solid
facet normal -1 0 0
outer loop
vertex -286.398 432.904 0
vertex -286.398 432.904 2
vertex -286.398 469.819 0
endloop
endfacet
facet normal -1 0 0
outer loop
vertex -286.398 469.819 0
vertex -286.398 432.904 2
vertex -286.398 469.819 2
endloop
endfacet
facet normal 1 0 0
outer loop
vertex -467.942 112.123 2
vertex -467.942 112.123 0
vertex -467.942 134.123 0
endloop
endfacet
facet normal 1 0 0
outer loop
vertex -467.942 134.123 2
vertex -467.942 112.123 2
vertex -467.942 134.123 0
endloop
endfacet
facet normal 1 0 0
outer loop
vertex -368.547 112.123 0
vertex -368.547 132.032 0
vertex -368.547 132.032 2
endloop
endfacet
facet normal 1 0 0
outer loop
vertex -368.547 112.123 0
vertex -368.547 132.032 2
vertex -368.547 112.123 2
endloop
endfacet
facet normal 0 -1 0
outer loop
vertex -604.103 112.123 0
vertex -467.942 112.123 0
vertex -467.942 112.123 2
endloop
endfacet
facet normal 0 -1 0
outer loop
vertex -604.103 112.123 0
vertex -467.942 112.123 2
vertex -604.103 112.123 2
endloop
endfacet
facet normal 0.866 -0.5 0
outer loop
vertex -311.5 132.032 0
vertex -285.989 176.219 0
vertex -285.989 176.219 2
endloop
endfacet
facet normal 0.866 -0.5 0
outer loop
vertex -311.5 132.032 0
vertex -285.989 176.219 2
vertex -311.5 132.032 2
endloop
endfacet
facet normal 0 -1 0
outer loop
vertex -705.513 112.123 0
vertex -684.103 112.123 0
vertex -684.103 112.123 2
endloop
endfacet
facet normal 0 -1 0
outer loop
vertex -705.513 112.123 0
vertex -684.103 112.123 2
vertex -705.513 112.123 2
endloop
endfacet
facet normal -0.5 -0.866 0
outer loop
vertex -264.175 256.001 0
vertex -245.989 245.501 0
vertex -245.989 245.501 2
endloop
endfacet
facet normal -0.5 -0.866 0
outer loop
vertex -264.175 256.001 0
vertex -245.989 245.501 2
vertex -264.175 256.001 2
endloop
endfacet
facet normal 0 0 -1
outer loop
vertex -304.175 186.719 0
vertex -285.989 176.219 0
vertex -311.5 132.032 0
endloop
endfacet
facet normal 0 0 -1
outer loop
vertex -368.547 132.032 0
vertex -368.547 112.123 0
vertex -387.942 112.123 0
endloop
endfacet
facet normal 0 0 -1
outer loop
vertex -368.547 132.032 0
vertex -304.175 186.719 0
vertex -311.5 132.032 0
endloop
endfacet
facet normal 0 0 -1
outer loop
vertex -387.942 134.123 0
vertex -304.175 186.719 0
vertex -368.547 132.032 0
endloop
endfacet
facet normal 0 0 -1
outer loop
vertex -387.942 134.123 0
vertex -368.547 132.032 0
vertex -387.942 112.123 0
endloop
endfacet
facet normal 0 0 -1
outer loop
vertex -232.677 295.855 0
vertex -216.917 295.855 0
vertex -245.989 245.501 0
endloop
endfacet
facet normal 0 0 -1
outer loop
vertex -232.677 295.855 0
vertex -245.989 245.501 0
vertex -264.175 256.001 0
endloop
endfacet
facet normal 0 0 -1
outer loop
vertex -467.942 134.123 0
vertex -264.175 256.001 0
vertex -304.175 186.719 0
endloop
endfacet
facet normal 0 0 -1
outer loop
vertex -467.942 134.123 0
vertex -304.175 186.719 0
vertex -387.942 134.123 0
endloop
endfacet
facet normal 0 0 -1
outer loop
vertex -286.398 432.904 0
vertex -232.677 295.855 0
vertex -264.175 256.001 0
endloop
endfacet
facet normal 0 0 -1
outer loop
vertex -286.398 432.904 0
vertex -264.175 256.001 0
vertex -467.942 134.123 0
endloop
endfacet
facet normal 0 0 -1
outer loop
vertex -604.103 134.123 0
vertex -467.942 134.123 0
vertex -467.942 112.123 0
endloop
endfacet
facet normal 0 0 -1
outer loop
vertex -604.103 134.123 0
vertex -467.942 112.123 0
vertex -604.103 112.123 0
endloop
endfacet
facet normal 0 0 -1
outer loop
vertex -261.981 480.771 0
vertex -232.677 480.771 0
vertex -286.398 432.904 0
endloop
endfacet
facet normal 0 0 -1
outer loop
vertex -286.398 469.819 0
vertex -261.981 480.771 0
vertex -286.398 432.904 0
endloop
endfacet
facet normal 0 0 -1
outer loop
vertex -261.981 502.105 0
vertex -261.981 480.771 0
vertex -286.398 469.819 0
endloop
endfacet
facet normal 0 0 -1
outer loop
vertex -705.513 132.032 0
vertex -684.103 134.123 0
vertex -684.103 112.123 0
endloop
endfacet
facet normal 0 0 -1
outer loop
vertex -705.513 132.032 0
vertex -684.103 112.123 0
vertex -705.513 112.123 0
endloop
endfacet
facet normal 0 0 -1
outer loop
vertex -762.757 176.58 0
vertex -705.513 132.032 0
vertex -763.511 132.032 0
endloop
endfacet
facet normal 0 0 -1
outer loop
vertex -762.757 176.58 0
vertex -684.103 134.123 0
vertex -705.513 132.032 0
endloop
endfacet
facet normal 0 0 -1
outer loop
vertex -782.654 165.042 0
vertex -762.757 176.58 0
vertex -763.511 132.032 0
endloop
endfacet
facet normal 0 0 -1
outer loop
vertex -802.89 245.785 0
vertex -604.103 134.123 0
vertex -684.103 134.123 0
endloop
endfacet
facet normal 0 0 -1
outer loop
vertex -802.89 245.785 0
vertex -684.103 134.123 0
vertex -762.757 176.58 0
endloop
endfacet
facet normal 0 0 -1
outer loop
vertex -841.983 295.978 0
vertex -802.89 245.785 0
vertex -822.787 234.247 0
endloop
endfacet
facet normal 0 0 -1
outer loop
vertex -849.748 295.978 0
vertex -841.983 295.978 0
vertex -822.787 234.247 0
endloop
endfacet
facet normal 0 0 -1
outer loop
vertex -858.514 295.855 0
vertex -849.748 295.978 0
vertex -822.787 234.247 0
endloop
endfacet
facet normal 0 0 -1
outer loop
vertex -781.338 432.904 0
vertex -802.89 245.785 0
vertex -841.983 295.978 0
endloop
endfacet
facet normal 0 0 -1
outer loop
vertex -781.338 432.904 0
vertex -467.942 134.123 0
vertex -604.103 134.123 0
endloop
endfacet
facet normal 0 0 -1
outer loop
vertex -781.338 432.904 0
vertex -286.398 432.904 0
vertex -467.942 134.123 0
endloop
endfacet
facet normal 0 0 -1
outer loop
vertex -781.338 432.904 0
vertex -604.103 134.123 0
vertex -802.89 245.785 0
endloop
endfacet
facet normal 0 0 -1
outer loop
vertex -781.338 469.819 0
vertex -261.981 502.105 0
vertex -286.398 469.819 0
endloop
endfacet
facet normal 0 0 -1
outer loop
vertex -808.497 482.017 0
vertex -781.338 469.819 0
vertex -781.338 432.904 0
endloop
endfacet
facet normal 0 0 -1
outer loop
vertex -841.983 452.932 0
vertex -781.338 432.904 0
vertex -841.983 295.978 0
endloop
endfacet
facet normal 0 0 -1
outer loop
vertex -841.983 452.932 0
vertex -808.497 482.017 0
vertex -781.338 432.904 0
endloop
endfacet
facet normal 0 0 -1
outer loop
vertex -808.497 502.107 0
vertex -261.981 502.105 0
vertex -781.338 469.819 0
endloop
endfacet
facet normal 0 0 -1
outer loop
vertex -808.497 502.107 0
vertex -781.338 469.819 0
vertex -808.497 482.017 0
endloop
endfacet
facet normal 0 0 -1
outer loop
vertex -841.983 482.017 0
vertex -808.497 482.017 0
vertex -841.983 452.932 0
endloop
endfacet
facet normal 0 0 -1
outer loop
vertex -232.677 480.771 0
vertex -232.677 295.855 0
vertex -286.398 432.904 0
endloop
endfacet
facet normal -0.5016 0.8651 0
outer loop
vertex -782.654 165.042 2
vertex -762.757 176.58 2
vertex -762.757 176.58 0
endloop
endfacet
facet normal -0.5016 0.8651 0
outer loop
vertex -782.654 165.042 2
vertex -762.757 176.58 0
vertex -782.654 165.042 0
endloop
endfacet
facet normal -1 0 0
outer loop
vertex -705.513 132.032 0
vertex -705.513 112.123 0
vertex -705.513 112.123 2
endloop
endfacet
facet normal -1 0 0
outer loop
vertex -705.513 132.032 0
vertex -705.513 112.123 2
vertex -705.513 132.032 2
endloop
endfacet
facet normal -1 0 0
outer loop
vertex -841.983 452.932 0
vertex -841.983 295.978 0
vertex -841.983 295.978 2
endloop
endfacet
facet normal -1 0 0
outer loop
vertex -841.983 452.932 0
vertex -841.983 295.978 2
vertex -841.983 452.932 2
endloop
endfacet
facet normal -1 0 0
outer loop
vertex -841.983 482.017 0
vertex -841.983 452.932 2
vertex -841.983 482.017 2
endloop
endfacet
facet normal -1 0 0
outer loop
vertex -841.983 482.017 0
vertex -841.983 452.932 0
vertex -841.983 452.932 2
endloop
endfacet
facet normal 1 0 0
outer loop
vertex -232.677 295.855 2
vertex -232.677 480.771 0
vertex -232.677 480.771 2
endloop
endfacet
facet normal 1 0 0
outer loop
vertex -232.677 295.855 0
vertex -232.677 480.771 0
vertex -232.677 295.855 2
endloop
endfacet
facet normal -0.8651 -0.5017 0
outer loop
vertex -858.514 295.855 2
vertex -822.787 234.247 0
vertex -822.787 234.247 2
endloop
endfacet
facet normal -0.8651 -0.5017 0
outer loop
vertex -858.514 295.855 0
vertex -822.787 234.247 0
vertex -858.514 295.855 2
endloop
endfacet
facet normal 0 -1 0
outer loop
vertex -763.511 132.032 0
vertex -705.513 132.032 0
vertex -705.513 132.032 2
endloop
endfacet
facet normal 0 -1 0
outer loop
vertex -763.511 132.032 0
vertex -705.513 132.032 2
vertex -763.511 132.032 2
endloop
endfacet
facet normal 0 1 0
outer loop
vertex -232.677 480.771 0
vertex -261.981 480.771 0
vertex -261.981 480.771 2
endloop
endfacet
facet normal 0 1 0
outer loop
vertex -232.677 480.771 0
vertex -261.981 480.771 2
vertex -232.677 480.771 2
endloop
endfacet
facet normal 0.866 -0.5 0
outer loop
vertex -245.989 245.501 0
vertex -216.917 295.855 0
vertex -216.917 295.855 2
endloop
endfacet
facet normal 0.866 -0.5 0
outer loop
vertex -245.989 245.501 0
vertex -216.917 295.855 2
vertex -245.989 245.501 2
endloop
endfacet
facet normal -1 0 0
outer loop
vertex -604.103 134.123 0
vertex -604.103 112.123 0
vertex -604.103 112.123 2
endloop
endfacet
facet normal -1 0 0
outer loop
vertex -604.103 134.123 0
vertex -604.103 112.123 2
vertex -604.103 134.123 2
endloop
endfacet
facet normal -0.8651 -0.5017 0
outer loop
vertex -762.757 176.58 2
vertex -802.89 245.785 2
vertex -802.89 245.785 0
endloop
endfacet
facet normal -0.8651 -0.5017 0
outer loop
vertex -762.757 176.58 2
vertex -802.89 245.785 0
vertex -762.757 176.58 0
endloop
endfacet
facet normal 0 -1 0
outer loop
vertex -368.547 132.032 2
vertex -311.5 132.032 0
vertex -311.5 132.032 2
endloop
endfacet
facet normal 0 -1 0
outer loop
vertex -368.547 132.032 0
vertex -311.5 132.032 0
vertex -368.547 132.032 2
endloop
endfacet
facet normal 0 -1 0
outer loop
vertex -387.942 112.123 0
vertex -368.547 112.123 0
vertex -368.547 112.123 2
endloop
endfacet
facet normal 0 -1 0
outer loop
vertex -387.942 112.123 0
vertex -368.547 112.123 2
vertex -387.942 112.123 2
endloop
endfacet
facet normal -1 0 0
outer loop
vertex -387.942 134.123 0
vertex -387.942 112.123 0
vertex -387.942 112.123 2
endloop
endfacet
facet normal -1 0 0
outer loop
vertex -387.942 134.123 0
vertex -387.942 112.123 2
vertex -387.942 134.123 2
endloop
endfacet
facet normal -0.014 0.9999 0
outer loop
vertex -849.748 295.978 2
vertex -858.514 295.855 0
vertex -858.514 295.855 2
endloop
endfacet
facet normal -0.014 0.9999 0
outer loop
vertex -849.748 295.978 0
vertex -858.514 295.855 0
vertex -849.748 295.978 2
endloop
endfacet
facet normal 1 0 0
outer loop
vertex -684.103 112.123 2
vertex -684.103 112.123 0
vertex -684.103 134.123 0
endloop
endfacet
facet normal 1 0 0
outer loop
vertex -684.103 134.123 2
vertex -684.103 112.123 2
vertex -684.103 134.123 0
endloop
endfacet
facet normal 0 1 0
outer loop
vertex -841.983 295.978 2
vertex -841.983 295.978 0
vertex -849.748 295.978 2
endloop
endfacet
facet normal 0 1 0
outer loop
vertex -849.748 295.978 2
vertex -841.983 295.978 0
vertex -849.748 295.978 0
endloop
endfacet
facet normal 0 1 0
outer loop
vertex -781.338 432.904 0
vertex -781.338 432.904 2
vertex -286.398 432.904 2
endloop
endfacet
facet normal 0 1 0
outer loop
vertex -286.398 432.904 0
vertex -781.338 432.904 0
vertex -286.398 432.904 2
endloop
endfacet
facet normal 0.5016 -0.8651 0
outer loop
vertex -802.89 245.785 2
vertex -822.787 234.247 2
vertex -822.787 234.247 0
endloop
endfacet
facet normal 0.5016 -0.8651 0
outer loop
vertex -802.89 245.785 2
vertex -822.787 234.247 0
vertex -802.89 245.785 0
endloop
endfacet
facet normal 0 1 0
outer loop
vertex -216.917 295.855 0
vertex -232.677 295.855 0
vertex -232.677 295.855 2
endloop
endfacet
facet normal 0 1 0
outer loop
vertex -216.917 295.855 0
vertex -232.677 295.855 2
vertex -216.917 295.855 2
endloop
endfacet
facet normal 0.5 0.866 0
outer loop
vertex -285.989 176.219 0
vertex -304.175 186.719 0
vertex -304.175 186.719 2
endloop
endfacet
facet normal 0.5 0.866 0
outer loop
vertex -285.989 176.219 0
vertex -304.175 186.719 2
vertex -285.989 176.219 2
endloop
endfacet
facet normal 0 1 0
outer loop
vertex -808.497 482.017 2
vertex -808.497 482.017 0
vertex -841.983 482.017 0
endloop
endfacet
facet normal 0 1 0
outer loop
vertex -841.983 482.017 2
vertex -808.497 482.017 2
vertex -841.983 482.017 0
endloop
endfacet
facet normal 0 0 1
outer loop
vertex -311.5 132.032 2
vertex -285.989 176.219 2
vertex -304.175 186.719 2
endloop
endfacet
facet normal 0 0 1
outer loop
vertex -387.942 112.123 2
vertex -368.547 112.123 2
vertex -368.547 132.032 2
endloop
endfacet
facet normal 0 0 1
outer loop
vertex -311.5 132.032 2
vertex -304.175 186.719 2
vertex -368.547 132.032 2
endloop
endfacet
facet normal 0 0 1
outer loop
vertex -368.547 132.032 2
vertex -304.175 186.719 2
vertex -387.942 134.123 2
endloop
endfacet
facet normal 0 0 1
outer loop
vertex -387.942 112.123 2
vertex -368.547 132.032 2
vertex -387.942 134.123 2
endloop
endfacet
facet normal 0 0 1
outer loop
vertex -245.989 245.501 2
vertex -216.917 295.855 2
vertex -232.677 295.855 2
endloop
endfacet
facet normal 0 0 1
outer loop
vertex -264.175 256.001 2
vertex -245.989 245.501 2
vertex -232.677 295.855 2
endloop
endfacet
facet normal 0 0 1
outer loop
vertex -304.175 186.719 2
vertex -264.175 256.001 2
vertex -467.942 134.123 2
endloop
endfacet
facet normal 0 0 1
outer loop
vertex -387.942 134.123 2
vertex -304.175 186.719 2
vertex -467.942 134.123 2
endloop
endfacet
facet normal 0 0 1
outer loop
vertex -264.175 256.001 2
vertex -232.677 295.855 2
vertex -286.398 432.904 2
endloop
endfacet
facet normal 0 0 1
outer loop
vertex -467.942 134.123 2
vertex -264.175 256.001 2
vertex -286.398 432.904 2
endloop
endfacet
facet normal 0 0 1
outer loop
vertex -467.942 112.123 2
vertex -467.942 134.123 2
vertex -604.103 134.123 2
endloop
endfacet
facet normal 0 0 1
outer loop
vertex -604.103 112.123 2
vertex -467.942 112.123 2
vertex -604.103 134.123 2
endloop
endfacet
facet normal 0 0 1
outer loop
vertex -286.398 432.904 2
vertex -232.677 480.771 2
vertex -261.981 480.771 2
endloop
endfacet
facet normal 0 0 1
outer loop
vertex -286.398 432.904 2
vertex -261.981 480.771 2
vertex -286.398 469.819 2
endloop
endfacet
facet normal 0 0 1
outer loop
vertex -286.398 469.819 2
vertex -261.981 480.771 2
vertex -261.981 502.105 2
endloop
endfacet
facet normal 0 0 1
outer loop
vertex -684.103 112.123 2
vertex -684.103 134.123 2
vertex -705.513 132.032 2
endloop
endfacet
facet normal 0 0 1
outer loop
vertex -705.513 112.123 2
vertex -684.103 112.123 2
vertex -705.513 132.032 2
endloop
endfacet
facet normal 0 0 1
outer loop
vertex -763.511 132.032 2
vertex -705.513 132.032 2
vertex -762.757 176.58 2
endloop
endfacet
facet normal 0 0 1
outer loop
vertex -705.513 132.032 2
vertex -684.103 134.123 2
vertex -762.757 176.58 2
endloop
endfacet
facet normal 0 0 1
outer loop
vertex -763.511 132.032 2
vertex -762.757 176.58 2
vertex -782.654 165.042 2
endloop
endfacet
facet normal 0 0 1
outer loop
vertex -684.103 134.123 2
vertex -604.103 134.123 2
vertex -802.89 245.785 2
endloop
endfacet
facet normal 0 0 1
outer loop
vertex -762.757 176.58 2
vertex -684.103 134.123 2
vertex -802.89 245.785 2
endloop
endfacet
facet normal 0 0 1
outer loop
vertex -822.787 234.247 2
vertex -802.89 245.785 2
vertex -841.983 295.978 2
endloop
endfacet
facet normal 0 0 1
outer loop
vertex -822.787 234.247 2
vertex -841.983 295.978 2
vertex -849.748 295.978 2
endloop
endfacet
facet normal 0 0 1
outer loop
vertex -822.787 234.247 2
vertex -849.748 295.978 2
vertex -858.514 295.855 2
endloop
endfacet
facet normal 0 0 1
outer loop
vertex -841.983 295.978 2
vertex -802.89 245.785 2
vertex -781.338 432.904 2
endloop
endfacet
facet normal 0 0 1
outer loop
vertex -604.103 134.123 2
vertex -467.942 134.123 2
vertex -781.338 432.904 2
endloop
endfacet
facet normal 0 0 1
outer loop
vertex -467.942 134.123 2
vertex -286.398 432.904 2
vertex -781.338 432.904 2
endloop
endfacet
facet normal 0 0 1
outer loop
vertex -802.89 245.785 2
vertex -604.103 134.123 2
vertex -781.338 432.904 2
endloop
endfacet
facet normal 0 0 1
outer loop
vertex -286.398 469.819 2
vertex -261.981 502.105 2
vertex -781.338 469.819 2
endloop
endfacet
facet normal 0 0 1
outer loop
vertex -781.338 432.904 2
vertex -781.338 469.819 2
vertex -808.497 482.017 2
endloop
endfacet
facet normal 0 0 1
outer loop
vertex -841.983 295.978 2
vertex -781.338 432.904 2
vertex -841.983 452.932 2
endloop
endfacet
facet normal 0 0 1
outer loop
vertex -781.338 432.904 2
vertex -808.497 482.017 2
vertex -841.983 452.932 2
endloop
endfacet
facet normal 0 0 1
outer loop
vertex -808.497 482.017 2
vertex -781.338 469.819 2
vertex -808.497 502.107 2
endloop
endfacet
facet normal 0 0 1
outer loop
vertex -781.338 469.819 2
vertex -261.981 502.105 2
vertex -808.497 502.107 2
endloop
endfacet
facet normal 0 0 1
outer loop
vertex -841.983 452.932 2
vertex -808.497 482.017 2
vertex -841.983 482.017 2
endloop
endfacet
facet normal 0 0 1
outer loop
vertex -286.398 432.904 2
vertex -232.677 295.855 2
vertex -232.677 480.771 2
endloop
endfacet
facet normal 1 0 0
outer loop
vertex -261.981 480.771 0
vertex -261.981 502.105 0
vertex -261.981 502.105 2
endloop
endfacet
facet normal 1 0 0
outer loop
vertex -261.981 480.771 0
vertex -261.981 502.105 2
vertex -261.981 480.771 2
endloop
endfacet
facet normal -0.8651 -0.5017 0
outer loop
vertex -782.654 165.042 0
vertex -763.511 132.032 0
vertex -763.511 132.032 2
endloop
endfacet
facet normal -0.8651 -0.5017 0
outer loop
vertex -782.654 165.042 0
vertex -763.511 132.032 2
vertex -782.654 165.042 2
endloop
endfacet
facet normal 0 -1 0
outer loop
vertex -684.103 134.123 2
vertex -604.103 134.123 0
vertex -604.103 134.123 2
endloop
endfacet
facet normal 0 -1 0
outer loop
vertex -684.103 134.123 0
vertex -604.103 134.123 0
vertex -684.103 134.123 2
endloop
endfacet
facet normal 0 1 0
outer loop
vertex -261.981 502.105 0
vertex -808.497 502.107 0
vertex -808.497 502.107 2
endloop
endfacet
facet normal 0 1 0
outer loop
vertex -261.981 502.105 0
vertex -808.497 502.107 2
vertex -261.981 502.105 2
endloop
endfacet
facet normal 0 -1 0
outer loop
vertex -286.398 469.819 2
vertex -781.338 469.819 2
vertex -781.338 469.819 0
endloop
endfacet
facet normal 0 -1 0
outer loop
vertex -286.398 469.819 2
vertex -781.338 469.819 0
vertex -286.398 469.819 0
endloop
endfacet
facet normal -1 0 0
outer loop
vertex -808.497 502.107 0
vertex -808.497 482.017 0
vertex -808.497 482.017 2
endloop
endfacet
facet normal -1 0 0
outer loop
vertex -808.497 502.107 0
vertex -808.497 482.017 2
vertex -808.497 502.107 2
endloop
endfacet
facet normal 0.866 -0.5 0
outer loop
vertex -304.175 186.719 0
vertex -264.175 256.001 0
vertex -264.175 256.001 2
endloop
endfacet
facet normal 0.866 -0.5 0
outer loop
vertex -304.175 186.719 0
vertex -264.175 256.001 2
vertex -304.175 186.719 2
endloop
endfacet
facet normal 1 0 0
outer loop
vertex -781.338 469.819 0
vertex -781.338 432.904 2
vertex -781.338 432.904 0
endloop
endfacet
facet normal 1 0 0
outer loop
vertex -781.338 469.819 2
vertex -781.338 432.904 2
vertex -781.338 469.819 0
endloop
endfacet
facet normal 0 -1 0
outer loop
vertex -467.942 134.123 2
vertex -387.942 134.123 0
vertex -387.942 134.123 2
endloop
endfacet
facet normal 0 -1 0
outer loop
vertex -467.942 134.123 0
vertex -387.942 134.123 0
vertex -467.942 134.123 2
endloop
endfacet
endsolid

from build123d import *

# Parameters (mm, degrees)
BOSS_EXTRUDE1_DEPTH = 2
CUT_EXTRUDE1_DEPTH  = 103
CUT_EXTRUDE2_DEPTH  = 103
SKETCH8_W           = 494.939291997
SKETCH8_H           = 36.91417239
CUT_EXTRUDE3_DEPTH  = 103
SKETCH9_W           = 80
SKETCH9_H           = 22
CUT_EXTRUDE4_DEPTH  = 103
SKETCH10_W          = 80
SKETCH10_H          = 22
CUT_EXTRUDE5_DEPTH  = 10
CUT_EXTRUDE26_DEPTH = 50
SKETCH20_W          = 123.508554763
SKETCH20_H          = 186.038500142
CUT_EXTRUDE27_DEPTH = 50


with BuildPart() as part:
    # Sketch4 → Boss-Extrude1 (new body)
    with BuildSketch(Plane.XY):
        Polygon((-808.497250172, 502.106800376), (-261.98073047, 502.105226222), (-261.98073047, 480.770733626), (-232.677404129, 480.770733626), (-232.677404129, 452.134951617), (-212.25184889, 452.134951617), (-212.192076558, 346.868854324), (-232.677404129, 346.868854324), (-232.677404129, 295.854721303), (-216.917061767, 295.854721303), (-311.499917796, 132.032409135), (-368.546557809, 132.032409135), (-368.546557809, 112.12343356), (-705.513477189, 112.12343356), (-705.513477189, 132.032409135), (-763.511495449, 132.032409135), (-858.513561886, 295.854721303), (-842.744632695, 296.076779874), (-842.744632695, 346.305423028), (-862.968217561, 346.305423028), (-862.968217561, 452.932027611), (-841.983456779, 452.932027611), (-841.983456779, 482.016653843), (-813.304156304, 482.016653843), (-808.497250172, 482.016653843), align=None)
    extrude(amount=BOSS_EXTRUDE1_DEPTH)

    # Sketch6 → Cut-Extrude1 (cut)
    with BuildSketch(Plane.XY.offset(2)):
        Polygon((-822.786730896, 234.247092346), (-802.890229544, 245.785256582), (-762.757484374, 176.580034487), (-782.653985726, 165.041870251), align=None)
    extrude(amount=-CUT_EXTRUDE1_DEPTH, mode=Mode.SUBTRACT)

    # Sketch7 → Cut-Extrude2 (cut)
    with BuildSketch(Plane(origin=(0, 0, 0), x_dir=(-1, 0, 0), z_dir=(0, 0, -1))):
        Polygon((245.988579257, 245.501375956), (264.175112736, 256.001375956), (304.175112736, 186.719343654), (285.988579257, 176.219343654), align=None)
    extrude(amount=-CUT_EXTRUDE2_DEPTH, mode=Mode.SUBTRACT)

    # Sketch8 → Cut-Extrude3 (cut)
    with BuildSketch(Plane.XY.offset(2)):
        with Locations((-533.868102369, 451.361565469)):
            Rectangle(SKETCH8_W, SKETCH8_H)
    extrude(amount=-CUT_EXTRUDE3_DEPTH, mode=Mode.SUBTRACT)

    # Sketch9 → Cut-Extrude4 (cut)
    with BuildSketch(Plane(origin=(0, 0, 0), x_dir=(-1, 0, 0), z_dir=(0, 0, -1))):
        with Locations((427.942047779, 123.12343356)):
            Rectangle(SKETCH9_W, SKETCH9_H)
    extrude(amount=-CUT_EXTRUDE4_DEPTH, mode=Mode.SUBTRACT)

    # Sketch10 → Cut-Extrude5 (cut)
    with BuildSketch(Plane(origin=(0, 0, 0), x_dir=(-1, 0, 0), z_dir=(0, 0, -1))):
        with Locations((644.102693804, 123.12343356)):
            Rectangle(SKETCH10_W, SKETCH10_H)
    extrude(amount=-CUT_EXTRUDE5_DEPTH, mode=Mode.SUBTRACT)

    # Sketch18 → Cut-Extrude26 (cut)
    with BuildSketch(Plane(origin=(0, 0, 0), x_dir=(-1, 0, 0), z_dir=(0, 0, -1))):
        Polygon((232.677404129, 337.860322108), (232.677404129, 496.22384363), (155.712939473, 496.22384363), (155.712939473, 334.151575125), (232.677404129, 334.151575125), align=None)
    extrude(amount=-CUT_EXTRUDE26_DEPTH, mode=Mode.SUBTRACT)

    # Sketch20 → Cut-Extrude27 (cut)
    with BuildSketch(Plane(origin=(0, 0, 0), x_dir=(-1, 0, 0), z_dir=(0, 0, -1))):
        with Locations((903.737734161, 388.997403772)):
            Rectangle(SKETCH20_W, SKETCH20_H)
    extrude(amount=-CUT_EXTRUDE27_DEPTH, mode=Mode.SUBTRACT)


solid = part.part
